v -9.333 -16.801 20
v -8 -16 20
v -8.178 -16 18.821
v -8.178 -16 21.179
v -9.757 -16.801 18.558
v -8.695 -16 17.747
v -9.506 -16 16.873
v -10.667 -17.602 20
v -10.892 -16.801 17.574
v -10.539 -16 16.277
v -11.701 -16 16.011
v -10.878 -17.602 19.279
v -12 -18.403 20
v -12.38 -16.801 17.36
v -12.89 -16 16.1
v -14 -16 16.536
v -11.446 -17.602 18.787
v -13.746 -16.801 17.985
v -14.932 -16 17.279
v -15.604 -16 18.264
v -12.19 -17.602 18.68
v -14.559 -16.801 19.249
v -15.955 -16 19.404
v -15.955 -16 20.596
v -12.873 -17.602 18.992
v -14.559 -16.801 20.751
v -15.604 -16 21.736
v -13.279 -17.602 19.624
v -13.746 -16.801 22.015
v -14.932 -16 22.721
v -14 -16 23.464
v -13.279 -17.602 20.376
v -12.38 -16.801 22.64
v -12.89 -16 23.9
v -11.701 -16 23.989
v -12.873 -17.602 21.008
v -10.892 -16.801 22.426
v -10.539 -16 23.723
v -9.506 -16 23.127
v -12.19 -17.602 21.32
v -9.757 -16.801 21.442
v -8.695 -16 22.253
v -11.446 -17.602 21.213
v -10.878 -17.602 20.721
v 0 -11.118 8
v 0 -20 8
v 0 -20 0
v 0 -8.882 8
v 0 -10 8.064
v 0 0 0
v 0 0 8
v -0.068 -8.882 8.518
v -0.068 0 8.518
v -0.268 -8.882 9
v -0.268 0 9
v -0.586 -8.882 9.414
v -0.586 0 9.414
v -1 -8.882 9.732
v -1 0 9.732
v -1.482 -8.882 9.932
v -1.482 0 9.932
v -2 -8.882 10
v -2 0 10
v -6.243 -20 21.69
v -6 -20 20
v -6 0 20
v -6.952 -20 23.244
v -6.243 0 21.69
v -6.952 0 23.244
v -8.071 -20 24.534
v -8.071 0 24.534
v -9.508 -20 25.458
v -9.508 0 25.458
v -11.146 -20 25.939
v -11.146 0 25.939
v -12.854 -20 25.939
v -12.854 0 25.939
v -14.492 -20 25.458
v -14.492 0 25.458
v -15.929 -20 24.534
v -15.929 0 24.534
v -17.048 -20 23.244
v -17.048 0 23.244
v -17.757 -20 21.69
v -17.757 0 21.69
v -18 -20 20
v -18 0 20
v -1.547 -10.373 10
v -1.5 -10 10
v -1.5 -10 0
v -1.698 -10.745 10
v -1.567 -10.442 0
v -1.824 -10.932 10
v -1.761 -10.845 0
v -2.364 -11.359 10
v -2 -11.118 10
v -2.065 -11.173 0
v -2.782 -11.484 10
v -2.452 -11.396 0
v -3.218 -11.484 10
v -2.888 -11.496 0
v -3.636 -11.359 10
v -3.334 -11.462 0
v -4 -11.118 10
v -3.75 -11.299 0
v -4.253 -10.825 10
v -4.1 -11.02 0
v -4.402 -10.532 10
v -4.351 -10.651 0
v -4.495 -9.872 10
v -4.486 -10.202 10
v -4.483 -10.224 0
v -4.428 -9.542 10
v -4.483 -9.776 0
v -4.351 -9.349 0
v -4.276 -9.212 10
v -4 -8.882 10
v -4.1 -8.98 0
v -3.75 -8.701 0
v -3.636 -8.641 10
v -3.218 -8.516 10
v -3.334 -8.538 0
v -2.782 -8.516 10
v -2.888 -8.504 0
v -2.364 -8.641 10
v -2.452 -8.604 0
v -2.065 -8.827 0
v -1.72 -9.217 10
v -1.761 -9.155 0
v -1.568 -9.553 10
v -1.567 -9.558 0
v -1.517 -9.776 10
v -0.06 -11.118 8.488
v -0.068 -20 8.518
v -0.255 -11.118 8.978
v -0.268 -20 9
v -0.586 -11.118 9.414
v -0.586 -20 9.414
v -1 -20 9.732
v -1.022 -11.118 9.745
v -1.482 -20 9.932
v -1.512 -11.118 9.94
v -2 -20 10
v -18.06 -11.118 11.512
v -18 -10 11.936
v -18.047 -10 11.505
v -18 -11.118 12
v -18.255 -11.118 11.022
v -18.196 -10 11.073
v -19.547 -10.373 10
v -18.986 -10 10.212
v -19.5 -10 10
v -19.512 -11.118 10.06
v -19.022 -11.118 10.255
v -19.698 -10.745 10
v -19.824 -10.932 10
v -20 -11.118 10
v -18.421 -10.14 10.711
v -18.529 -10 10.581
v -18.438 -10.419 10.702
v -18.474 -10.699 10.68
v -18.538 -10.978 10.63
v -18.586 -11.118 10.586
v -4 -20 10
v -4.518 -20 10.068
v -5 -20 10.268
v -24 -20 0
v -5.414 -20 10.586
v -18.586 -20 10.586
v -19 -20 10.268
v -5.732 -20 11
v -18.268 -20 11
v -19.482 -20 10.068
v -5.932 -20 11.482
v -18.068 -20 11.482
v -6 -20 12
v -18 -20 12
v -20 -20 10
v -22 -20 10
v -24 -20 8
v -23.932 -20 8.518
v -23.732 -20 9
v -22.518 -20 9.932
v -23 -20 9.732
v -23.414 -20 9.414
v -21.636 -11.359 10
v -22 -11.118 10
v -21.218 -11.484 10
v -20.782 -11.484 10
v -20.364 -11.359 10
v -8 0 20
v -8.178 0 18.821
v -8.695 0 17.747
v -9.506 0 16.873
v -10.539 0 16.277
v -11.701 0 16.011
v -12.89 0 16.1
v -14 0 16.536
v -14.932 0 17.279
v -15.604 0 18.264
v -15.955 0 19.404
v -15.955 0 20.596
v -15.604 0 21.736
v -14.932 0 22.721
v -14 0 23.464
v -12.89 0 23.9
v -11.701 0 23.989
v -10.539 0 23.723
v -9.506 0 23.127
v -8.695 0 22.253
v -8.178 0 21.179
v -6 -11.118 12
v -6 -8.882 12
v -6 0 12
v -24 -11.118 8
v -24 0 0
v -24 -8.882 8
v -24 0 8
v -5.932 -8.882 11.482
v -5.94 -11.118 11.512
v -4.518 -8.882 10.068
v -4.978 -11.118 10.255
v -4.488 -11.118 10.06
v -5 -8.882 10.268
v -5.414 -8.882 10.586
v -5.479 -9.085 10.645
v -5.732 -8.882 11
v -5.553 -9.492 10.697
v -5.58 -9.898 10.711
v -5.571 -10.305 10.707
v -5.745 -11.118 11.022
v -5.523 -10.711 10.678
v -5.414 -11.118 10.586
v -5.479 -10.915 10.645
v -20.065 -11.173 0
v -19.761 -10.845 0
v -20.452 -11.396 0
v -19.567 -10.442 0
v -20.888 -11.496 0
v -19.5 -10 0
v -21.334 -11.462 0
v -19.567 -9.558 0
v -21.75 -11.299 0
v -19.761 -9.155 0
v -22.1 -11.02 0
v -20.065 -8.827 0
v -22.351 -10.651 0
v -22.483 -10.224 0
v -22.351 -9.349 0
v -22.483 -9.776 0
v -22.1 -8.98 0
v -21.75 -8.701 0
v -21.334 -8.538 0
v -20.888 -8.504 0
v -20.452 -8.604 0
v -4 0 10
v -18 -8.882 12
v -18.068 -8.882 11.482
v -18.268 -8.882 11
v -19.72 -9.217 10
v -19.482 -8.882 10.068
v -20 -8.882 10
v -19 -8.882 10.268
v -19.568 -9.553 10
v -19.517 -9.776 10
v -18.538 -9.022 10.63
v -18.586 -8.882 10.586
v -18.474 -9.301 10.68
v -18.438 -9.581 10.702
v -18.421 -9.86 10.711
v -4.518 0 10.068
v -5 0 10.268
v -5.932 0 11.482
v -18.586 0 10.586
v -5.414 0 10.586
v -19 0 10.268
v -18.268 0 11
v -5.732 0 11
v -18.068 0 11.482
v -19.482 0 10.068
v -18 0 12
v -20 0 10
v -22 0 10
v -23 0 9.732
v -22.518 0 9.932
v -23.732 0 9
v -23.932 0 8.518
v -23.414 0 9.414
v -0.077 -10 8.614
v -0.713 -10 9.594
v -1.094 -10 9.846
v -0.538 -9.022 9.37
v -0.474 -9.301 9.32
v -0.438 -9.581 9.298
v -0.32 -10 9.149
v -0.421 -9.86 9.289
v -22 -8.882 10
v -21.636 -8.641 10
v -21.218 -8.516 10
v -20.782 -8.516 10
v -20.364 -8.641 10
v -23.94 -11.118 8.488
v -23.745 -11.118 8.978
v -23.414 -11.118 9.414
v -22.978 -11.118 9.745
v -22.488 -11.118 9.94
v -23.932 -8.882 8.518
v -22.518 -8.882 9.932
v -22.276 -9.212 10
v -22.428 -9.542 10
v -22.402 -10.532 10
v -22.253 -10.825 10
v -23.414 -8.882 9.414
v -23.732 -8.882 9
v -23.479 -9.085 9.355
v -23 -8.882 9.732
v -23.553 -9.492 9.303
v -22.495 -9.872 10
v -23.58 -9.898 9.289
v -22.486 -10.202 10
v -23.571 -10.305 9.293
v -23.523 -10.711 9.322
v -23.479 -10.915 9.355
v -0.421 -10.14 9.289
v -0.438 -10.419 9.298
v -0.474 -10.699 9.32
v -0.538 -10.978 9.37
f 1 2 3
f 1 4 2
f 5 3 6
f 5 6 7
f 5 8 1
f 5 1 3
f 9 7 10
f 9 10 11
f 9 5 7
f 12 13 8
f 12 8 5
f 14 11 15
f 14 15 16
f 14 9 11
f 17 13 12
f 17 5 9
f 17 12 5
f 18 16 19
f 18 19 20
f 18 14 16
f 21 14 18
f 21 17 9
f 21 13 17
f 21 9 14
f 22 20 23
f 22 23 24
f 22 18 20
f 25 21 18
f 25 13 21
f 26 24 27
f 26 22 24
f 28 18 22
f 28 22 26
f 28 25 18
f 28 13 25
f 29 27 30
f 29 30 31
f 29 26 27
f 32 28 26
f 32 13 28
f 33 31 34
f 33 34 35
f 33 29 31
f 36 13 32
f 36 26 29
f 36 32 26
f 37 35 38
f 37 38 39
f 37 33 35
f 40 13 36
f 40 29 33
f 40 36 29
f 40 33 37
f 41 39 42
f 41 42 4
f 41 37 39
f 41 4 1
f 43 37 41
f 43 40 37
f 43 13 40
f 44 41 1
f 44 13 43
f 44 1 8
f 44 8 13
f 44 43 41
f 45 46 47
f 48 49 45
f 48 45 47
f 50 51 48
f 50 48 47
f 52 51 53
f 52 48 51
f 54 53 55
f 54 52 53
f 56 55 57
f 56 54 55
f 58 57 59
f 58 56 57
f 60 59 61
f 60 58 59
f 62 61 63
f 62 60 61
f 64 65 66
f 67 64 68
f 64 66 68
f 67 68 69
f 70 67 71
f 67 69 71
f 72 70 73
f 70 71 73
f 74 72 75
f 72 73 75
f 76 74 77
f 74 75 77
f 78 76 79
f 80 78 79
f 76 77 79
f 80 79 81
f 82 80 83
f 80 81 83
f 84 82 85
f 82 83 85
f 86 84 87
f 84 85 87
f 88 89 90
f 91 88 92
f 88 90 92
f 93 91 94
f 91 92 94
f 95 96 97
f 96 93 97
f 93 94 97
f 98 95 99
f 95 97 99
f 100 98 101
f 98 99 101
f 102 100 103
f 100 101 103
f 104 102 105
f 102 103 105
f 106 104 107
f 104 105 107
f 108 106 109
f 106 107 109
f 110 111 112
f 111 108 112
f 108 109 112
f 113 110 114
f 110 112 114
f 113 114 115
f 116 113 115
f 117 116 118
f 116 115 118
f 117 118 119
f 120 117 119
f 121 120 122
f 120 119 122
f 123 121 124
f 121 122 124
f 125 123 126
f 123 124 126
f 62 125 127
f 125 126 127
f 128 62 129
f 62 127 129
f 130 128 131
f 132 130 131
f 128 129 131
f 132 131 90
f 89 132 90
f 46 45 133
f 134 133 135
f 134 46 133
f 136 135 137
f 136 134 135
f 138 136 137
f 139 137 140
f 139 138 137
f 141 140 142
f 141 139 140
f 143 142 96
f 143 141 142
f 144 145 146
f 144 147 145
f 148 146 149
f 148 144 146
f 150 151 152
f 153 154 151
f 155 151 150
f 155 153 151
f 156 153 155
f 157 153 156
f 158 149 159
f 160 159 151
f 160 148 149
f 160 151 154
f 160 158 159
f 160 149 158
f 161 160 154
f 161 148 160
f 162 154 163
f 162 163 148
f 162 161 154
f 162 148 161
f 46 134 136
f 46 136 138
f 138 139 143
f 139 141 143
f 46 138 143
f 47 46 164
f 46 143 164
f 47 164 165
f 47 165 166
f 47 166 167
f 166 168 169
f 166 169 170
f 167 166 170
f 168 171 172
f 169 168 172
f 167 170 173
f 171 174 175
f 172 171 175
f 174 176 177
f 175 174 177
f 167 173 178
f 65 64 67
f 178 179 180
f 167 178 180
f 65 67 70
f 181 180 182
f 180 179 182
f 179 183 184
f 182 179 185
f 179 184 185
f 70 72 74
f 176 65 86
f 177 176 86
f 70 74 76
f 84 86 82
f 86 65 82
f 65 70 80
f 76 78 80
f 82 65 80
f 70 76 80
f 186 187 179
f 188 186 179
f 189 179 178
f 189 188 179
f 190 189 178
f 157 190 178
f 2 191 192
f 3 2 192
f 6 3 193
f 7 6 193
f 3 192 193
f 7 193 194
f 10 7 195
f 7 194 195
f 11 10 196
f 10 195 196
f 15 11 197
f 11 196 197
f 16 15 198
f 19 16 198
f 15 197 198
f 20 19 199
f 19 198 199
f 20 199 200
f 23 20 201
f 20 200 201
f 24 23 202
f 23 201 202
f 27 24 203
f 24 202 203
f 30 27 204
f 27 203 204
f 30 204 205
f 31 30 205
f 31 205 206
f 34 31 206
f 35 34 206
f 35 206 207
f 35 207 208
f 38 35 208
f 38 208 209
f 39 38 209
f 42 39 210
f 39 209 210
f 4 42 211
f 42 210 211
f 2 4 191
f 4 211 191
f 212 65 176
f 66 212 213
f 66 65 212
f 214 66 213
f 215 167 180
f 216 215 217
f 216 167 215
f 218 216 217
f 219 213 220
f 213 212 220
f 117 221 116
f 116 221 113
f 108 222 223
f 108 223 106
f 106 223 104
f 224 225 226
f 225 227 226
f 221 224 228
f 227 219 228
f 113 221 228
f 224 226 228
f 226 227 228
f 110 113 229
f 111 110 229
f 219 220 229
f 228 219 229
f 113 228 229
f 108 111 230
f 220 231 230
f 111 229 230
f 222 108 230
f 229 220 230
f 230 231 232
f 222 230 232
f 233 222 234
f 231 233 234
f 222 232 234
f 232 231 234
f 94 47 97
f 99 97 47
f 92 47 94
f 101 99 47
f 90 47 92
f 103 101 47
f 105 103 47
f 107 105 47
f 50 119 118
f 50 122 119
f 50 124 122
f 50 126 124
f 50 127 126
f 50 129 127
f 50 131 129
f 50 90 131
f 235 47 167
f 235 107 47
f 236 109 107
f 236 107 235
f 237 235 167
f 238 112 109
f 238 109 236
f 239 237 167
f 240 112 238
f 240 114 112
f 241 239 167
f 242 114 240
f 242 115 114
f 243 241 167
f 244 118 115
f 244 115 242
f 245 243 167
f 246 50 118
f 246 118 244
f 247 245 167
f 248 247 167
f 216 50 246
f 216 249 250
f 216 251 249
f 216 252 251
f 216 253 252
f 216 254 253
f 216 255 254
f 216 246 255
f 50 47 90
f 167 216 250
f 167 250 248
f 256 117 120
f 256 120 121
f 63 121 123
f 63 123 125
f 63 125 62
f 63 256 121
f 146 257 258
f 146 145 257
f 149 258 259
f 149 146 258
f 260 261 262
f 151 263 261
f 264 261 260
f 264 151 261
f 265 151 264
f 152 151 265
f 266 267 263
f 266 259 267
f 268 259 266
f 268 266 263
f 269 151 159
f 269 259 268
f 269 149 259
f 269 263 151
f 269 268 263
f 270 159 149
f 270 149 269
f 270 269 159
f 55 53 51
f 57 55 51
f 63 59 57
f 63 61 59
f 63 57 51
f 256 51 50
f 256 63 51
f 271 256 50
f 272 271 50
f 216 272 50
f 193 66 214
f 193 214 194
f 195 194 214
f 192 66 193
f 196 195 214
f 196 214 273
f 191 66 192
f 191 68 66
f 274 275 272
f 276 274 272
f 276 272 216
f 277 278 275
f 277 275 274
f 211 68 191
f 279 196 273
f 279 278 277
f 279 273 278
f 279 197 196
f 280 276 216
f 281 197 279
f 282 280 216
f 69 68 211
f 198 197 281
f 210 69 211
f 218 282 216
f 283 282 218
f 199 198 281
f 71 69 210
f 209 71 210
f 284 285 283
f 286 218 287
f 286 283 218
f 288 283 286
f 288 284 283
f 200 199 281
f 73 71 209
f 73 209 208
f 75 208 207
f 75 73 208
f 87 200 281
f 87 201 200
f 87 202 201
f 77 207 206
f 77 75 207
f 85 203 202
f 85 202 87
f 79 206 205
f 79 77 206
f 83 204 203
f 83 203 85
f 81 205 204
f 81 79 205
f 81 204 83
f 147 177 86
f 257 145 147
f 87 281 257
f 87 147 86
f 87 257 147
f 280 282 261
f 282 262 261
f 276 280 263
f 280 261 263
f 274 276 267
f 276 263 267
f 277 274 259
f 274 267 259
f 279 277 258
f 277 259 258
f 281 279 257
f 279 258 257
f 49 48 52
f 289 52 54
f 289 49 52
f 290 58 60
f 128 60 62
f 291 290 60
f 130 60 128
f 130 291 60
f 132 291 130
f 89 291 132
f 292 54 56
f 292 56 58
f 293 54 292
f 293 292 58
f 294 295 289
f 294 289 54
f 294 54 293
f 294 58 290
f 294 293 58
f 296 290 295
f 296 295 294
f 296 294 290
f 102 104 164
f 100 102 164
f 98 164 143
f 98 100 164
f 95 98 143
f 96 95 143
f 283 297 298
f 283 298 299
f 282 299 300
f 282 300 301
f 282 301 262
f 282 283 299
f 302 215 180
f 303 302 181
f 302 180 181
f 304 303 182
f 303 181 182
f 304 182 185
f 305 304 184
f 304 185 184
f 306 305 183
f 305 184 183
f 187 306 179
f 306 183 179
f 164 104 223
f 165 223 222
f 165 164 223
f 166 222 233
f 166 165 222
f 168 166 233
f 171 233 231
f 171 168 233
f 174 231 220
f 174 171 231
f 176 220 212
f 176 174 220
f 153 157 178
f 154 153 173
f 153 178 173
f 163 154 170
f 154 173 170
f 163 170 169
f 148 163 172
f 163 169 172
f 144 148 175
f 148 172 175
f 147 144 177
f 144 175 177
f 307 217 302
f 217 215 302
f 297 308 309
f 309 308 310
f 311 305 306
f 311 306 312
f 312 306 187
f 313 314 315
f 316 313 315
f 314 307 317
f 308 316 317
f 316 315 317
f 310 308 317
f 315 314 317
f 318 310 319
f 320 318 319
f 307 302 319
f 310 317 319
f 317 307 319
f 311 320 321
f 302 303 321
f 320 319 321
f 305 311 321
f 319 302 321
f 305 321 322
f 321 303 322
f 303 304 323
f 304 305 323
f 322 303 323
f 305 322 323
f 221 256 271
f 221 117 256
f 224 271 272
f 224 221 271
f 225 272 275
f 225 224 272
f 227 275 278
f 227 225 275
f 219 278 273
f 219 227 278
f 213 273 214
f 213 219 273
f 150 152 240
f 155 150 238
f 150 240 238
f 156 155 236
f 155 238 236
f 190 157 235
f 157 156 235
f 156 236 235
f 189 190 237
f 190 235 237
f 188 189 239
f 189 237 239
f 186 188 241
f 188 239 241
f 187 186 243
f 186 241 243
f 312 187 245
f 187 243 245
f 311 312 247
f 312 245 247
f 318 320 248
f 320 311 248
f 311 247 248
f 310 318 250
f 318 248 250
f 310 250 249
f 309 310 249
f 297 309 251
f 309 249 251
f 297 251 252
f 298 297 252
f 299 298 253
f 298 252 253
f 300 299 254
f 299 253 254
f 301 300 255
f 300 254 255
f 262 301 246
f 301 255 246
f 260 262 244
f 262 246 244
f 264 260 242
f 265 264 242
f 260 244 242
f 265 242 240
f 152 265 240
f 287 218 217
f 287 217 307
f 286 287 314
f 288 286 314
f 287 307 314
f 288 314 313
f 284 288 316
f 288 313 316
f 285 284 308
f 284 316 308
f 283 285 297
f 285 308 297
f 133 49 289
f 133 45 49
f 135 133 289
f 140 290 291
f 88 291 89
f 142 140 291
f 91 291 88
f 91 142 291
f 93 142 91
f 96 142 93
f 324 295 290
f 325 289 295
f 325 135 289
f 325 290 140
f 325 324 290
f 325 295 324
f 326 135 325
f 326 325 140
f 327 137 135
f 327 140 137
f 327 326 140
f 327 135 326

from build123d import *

# Parameters (mm, degrees)
PAD_DEPTH      = 20
SKETCH001_R    = 1.5
HOLE_DEPTH     = 25
HOLE_TIPS_R    = 1.5
SKETCH002_R    = 4
HOLE001_DEPTH  = 16
HOLE001_TIPS_R = 4
FILLET_R       = 2


with BuildPart() as part:
    # Sketch → Pad (new body)
    with BuildSketch(Plane.XZ):
        with BuildLine():
            Line((0, 0), (-24, 0))
            Line((-24, 0), (-24, 10))
            Line((-24, 10), (-18, 10))
            Line((-18, 10), (-18, 20))
            ThreePointArc((-6, 20), (-12, 26), (-18, 20))
            Line((-6, 20), (-6, 10))
            Line((-6, 10), (0, 10))
            Line((0, 10), (0, 0))
        make_face()
    extrude(amount=PAD_DEPTH)

    # Sketch001 (on Face4 of Pad) → Hole (cut)
    with BuildSketch(Plane(origin=(0, 0, 0), x_dir=(1, 0, 0), z_dir=(0, 0, -1))):
        with Locations((-21, 10)):
            Circle(SKETCH001_R)
        with Locations((-3, 10)):
            Circle(SKETCH001_R)
    extrude(amount=-HOLE_DEPTH, mode=Mode.SUBTRACT)

    # Hole tips → Hole tip 1 section 0
    with BuildSketch(Plane(origin=(0, 0, 25), x_dir=(1, 0, 0), z_dir=(0, 0, -1)), mode=Mode.PRIVATE) as hole_tip_1_s0:
        with Locations((-21, 10)):
            Circle(HOLE_TIPS_R)
    loft([hole_tip_1_s0.sketch, Vertex(-21, -10, 25.901291)], mode=Mode.SUBTRACT)

    # Hole tips → Hole tip 2 section 0
    with BuildSketch(Plane(origin=(0, 0, 25), x_dir=(1, 0, 0), z_dir=(0, 0, -1)), mode=Mode.PRIVATE) as hole_tip_2_s0:
        with Locations((-3, 10)):
            Circle(HOLE_TIPS_R)
    loft([hole_tip_2_s0.sketch, Vertex(-3, -10, 25.901291)], mode=Mode.SUBTRACT)

    # Sketch002 (on Face4 of Hole) → Hole001 (cut)
    with BuildSketch(Plane(origin=(0, 0, 0), x_dir=(1, 0, 0), z_dir=(0, 1, 0))):
        with Locations((-12, -20)):
            Circle(SKETCH002_R)
    extrude(amount=-HOLE001_DEPTH, mode=Mode.SUBTRACT)

    # Hole001 tips → Hole001 tip 1 section 0
    with BuildSketch(Plane(origin=(0, -16, 0), x_dir=(1, 0, 0), z_dir=(0, 1, 0)), mode=Mode.PRIVATE) as hole001_tip_1_s0:
        with Locations((-12, -20)):
            Circle(HOLE001_TIPS_R)
    loft([hole001_tip_1_s0.sketch, Vertex(-12, -18.403442, 20)], mode=Mode.SUBTRACT)

    # Fillet
    fillet_edges = [part.edges().sort_by_distance(p)[0] for p in [
        (0, -10, 10),
        (-6, -10, 10),
        (-24, -10, 10),
        (-18, -10, 10),
    ]]
    fillet(fillet_edges, radius=FILLET_R)


solid = part.part
